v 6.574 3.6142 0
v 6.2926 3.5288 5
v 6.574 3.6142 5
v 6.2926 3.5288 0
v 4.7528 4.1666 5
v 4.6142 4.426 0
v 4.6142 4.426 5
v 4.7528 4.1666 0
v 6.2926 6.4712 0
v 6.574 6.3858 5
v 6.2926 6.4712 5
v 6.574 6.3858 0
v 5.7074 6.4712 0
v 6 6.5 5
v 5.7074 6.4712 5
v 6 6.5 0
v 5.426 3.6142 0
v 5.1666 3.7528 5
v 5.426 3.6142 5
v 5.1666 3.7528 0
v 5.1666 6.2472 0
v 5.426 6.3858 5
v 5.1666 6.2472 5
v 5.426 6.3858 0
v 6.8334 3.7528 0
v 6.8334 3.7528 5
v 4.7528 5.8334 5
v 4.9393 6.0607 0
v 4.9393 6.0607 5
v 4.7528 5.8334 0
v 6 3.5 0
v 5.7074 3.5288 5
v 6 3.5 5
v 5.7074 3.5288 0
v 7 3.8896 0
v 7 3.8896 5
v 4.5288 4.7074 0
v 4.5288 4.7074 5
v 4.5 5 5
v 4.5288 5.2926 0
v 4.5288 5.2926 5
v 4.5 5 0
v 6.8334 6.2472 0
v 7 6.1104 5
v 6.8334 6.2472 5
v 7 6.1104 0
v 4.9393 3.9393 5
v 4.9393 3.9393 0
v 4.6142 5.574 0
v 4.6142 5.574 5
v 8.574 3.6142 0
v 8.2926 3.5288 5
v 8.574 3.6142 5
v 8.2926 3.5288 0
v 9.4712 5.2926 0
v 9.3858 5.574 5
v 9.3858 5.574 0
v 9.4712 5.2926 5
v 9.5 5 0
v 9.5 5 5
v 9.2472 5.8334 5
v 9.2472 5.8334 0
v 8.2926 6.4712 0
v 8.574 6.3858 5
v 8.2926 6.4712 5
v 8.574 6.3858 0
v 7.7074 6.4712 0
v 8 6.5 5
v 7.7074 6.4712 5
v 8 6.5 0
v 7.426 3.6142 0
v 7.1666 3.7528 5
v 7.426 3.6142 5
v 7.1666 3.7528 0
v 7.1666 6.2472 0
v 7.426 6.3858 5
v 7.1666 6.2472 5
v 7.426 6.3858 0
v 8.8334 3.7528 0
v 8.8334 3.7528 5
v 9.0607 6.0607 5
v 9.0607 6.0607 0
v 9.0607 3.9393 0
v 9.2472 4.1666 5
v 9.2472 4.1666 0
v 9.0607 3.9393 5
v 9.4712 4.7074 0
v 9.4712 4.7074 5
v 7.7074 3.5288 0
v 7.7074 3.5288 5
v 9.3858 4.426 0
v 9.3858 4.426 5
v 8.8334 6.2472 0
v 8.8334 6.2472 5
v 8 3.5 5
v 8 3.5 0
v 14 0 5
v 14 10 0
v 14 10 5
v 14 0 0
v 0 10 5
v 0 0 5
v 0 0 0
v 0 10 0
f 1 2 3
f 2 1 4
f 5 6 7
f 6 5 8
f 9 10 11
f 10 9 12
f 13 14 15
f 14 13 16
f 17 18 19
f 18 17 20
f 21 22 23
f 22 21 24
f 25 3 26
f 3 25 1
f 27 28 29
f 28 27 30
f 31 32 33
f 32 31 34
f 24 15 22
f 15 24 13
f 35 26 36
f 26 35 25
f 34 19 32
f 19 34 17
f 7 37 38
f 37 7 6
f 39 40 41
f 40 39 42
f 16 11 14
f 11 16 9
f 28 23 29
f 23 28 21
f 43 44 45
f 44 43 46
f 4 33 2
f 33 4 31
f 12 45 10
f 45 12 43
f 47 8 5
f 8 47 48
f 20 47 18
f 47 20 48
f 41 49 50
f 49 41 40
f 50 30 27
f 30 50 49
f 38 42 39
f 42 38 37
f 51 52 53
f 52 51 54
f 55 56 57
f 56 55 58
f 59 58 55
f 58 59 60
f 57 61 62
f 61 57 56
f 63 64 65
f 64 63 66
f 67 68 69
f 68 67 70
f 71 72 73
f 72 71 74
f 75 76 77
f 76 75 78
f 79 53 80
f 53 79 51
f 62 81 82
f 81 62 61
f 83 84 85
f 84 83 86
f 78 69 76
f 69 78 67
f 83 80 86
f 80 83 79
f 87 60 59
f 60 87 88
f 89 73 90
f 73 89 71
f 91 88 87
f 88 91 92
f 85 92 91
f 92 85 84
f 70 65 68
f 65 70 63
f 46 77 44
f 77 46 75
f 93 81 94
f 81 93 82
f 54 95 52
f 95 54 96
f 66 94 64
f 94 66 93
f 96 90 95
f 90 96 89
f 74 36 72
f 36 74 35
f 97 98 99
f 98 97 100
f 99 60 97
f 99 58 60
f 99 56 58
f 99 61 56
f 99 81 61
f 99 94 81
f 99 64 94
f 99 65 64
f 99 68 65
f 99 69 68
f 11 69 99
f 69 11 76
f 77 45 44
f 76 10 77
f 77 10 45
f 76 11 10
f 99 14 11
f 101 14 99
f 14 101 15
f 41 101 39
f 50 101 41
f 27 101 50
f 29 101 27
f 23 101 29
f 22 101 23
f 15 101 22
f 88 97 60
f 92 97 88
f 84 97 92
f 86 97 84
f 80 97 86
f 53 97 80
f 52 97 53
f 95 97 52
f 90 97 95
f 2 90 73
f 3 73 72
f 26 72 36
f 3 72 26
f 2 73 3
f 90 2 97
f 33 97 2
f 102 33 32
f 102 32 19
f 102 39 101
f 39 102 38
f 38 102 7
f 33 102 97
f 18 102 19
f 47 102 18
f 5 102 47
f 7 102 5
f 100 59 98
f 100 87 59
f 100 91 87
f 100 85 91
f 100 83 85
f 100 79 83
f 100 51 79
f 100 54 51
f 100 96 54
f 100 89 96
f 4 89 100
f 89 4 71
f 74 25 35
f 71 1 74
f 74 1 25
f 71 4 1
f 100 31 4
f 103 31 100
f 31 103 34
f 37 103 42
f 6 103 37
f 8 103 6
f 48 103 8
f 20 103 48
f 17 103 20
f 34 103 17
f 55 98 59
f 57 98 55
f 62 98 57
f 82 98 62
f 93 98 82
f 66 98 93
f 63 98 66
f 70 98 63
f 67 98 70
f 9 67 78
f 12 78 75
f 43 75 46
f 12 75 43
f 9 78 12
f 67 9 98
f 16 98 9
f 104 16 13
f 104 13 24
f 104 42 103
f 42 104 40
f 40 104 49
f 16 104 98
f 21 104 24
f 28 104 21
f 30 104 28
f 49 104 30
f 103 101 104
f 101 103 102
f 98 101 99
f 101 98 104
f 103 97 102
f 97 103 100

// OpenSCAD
$fn = 32;

// ----------------------------------------------------------------------
// Micro pad: two-hole pad, 5-20 mm class
// ----------------------------------------------------------------------

// --- parameters (mm) ---
pad_l = 14;               // pad length, X
pad_w = 10;               // pad width, Y
pad_t = 5;                // pad thickness, Z
hole_d = 3;               // hole diameter
hole_x = 6;               // X of the first hole centre

difference() {
  cube([pad_l, pad_w, pad_t]);
  for (x = [hole_x, pad_l - hole_x])
    translate([x, pad_w / 2, -1])
      cylinder(h = pad_t + 2, d = hole_d);
}
